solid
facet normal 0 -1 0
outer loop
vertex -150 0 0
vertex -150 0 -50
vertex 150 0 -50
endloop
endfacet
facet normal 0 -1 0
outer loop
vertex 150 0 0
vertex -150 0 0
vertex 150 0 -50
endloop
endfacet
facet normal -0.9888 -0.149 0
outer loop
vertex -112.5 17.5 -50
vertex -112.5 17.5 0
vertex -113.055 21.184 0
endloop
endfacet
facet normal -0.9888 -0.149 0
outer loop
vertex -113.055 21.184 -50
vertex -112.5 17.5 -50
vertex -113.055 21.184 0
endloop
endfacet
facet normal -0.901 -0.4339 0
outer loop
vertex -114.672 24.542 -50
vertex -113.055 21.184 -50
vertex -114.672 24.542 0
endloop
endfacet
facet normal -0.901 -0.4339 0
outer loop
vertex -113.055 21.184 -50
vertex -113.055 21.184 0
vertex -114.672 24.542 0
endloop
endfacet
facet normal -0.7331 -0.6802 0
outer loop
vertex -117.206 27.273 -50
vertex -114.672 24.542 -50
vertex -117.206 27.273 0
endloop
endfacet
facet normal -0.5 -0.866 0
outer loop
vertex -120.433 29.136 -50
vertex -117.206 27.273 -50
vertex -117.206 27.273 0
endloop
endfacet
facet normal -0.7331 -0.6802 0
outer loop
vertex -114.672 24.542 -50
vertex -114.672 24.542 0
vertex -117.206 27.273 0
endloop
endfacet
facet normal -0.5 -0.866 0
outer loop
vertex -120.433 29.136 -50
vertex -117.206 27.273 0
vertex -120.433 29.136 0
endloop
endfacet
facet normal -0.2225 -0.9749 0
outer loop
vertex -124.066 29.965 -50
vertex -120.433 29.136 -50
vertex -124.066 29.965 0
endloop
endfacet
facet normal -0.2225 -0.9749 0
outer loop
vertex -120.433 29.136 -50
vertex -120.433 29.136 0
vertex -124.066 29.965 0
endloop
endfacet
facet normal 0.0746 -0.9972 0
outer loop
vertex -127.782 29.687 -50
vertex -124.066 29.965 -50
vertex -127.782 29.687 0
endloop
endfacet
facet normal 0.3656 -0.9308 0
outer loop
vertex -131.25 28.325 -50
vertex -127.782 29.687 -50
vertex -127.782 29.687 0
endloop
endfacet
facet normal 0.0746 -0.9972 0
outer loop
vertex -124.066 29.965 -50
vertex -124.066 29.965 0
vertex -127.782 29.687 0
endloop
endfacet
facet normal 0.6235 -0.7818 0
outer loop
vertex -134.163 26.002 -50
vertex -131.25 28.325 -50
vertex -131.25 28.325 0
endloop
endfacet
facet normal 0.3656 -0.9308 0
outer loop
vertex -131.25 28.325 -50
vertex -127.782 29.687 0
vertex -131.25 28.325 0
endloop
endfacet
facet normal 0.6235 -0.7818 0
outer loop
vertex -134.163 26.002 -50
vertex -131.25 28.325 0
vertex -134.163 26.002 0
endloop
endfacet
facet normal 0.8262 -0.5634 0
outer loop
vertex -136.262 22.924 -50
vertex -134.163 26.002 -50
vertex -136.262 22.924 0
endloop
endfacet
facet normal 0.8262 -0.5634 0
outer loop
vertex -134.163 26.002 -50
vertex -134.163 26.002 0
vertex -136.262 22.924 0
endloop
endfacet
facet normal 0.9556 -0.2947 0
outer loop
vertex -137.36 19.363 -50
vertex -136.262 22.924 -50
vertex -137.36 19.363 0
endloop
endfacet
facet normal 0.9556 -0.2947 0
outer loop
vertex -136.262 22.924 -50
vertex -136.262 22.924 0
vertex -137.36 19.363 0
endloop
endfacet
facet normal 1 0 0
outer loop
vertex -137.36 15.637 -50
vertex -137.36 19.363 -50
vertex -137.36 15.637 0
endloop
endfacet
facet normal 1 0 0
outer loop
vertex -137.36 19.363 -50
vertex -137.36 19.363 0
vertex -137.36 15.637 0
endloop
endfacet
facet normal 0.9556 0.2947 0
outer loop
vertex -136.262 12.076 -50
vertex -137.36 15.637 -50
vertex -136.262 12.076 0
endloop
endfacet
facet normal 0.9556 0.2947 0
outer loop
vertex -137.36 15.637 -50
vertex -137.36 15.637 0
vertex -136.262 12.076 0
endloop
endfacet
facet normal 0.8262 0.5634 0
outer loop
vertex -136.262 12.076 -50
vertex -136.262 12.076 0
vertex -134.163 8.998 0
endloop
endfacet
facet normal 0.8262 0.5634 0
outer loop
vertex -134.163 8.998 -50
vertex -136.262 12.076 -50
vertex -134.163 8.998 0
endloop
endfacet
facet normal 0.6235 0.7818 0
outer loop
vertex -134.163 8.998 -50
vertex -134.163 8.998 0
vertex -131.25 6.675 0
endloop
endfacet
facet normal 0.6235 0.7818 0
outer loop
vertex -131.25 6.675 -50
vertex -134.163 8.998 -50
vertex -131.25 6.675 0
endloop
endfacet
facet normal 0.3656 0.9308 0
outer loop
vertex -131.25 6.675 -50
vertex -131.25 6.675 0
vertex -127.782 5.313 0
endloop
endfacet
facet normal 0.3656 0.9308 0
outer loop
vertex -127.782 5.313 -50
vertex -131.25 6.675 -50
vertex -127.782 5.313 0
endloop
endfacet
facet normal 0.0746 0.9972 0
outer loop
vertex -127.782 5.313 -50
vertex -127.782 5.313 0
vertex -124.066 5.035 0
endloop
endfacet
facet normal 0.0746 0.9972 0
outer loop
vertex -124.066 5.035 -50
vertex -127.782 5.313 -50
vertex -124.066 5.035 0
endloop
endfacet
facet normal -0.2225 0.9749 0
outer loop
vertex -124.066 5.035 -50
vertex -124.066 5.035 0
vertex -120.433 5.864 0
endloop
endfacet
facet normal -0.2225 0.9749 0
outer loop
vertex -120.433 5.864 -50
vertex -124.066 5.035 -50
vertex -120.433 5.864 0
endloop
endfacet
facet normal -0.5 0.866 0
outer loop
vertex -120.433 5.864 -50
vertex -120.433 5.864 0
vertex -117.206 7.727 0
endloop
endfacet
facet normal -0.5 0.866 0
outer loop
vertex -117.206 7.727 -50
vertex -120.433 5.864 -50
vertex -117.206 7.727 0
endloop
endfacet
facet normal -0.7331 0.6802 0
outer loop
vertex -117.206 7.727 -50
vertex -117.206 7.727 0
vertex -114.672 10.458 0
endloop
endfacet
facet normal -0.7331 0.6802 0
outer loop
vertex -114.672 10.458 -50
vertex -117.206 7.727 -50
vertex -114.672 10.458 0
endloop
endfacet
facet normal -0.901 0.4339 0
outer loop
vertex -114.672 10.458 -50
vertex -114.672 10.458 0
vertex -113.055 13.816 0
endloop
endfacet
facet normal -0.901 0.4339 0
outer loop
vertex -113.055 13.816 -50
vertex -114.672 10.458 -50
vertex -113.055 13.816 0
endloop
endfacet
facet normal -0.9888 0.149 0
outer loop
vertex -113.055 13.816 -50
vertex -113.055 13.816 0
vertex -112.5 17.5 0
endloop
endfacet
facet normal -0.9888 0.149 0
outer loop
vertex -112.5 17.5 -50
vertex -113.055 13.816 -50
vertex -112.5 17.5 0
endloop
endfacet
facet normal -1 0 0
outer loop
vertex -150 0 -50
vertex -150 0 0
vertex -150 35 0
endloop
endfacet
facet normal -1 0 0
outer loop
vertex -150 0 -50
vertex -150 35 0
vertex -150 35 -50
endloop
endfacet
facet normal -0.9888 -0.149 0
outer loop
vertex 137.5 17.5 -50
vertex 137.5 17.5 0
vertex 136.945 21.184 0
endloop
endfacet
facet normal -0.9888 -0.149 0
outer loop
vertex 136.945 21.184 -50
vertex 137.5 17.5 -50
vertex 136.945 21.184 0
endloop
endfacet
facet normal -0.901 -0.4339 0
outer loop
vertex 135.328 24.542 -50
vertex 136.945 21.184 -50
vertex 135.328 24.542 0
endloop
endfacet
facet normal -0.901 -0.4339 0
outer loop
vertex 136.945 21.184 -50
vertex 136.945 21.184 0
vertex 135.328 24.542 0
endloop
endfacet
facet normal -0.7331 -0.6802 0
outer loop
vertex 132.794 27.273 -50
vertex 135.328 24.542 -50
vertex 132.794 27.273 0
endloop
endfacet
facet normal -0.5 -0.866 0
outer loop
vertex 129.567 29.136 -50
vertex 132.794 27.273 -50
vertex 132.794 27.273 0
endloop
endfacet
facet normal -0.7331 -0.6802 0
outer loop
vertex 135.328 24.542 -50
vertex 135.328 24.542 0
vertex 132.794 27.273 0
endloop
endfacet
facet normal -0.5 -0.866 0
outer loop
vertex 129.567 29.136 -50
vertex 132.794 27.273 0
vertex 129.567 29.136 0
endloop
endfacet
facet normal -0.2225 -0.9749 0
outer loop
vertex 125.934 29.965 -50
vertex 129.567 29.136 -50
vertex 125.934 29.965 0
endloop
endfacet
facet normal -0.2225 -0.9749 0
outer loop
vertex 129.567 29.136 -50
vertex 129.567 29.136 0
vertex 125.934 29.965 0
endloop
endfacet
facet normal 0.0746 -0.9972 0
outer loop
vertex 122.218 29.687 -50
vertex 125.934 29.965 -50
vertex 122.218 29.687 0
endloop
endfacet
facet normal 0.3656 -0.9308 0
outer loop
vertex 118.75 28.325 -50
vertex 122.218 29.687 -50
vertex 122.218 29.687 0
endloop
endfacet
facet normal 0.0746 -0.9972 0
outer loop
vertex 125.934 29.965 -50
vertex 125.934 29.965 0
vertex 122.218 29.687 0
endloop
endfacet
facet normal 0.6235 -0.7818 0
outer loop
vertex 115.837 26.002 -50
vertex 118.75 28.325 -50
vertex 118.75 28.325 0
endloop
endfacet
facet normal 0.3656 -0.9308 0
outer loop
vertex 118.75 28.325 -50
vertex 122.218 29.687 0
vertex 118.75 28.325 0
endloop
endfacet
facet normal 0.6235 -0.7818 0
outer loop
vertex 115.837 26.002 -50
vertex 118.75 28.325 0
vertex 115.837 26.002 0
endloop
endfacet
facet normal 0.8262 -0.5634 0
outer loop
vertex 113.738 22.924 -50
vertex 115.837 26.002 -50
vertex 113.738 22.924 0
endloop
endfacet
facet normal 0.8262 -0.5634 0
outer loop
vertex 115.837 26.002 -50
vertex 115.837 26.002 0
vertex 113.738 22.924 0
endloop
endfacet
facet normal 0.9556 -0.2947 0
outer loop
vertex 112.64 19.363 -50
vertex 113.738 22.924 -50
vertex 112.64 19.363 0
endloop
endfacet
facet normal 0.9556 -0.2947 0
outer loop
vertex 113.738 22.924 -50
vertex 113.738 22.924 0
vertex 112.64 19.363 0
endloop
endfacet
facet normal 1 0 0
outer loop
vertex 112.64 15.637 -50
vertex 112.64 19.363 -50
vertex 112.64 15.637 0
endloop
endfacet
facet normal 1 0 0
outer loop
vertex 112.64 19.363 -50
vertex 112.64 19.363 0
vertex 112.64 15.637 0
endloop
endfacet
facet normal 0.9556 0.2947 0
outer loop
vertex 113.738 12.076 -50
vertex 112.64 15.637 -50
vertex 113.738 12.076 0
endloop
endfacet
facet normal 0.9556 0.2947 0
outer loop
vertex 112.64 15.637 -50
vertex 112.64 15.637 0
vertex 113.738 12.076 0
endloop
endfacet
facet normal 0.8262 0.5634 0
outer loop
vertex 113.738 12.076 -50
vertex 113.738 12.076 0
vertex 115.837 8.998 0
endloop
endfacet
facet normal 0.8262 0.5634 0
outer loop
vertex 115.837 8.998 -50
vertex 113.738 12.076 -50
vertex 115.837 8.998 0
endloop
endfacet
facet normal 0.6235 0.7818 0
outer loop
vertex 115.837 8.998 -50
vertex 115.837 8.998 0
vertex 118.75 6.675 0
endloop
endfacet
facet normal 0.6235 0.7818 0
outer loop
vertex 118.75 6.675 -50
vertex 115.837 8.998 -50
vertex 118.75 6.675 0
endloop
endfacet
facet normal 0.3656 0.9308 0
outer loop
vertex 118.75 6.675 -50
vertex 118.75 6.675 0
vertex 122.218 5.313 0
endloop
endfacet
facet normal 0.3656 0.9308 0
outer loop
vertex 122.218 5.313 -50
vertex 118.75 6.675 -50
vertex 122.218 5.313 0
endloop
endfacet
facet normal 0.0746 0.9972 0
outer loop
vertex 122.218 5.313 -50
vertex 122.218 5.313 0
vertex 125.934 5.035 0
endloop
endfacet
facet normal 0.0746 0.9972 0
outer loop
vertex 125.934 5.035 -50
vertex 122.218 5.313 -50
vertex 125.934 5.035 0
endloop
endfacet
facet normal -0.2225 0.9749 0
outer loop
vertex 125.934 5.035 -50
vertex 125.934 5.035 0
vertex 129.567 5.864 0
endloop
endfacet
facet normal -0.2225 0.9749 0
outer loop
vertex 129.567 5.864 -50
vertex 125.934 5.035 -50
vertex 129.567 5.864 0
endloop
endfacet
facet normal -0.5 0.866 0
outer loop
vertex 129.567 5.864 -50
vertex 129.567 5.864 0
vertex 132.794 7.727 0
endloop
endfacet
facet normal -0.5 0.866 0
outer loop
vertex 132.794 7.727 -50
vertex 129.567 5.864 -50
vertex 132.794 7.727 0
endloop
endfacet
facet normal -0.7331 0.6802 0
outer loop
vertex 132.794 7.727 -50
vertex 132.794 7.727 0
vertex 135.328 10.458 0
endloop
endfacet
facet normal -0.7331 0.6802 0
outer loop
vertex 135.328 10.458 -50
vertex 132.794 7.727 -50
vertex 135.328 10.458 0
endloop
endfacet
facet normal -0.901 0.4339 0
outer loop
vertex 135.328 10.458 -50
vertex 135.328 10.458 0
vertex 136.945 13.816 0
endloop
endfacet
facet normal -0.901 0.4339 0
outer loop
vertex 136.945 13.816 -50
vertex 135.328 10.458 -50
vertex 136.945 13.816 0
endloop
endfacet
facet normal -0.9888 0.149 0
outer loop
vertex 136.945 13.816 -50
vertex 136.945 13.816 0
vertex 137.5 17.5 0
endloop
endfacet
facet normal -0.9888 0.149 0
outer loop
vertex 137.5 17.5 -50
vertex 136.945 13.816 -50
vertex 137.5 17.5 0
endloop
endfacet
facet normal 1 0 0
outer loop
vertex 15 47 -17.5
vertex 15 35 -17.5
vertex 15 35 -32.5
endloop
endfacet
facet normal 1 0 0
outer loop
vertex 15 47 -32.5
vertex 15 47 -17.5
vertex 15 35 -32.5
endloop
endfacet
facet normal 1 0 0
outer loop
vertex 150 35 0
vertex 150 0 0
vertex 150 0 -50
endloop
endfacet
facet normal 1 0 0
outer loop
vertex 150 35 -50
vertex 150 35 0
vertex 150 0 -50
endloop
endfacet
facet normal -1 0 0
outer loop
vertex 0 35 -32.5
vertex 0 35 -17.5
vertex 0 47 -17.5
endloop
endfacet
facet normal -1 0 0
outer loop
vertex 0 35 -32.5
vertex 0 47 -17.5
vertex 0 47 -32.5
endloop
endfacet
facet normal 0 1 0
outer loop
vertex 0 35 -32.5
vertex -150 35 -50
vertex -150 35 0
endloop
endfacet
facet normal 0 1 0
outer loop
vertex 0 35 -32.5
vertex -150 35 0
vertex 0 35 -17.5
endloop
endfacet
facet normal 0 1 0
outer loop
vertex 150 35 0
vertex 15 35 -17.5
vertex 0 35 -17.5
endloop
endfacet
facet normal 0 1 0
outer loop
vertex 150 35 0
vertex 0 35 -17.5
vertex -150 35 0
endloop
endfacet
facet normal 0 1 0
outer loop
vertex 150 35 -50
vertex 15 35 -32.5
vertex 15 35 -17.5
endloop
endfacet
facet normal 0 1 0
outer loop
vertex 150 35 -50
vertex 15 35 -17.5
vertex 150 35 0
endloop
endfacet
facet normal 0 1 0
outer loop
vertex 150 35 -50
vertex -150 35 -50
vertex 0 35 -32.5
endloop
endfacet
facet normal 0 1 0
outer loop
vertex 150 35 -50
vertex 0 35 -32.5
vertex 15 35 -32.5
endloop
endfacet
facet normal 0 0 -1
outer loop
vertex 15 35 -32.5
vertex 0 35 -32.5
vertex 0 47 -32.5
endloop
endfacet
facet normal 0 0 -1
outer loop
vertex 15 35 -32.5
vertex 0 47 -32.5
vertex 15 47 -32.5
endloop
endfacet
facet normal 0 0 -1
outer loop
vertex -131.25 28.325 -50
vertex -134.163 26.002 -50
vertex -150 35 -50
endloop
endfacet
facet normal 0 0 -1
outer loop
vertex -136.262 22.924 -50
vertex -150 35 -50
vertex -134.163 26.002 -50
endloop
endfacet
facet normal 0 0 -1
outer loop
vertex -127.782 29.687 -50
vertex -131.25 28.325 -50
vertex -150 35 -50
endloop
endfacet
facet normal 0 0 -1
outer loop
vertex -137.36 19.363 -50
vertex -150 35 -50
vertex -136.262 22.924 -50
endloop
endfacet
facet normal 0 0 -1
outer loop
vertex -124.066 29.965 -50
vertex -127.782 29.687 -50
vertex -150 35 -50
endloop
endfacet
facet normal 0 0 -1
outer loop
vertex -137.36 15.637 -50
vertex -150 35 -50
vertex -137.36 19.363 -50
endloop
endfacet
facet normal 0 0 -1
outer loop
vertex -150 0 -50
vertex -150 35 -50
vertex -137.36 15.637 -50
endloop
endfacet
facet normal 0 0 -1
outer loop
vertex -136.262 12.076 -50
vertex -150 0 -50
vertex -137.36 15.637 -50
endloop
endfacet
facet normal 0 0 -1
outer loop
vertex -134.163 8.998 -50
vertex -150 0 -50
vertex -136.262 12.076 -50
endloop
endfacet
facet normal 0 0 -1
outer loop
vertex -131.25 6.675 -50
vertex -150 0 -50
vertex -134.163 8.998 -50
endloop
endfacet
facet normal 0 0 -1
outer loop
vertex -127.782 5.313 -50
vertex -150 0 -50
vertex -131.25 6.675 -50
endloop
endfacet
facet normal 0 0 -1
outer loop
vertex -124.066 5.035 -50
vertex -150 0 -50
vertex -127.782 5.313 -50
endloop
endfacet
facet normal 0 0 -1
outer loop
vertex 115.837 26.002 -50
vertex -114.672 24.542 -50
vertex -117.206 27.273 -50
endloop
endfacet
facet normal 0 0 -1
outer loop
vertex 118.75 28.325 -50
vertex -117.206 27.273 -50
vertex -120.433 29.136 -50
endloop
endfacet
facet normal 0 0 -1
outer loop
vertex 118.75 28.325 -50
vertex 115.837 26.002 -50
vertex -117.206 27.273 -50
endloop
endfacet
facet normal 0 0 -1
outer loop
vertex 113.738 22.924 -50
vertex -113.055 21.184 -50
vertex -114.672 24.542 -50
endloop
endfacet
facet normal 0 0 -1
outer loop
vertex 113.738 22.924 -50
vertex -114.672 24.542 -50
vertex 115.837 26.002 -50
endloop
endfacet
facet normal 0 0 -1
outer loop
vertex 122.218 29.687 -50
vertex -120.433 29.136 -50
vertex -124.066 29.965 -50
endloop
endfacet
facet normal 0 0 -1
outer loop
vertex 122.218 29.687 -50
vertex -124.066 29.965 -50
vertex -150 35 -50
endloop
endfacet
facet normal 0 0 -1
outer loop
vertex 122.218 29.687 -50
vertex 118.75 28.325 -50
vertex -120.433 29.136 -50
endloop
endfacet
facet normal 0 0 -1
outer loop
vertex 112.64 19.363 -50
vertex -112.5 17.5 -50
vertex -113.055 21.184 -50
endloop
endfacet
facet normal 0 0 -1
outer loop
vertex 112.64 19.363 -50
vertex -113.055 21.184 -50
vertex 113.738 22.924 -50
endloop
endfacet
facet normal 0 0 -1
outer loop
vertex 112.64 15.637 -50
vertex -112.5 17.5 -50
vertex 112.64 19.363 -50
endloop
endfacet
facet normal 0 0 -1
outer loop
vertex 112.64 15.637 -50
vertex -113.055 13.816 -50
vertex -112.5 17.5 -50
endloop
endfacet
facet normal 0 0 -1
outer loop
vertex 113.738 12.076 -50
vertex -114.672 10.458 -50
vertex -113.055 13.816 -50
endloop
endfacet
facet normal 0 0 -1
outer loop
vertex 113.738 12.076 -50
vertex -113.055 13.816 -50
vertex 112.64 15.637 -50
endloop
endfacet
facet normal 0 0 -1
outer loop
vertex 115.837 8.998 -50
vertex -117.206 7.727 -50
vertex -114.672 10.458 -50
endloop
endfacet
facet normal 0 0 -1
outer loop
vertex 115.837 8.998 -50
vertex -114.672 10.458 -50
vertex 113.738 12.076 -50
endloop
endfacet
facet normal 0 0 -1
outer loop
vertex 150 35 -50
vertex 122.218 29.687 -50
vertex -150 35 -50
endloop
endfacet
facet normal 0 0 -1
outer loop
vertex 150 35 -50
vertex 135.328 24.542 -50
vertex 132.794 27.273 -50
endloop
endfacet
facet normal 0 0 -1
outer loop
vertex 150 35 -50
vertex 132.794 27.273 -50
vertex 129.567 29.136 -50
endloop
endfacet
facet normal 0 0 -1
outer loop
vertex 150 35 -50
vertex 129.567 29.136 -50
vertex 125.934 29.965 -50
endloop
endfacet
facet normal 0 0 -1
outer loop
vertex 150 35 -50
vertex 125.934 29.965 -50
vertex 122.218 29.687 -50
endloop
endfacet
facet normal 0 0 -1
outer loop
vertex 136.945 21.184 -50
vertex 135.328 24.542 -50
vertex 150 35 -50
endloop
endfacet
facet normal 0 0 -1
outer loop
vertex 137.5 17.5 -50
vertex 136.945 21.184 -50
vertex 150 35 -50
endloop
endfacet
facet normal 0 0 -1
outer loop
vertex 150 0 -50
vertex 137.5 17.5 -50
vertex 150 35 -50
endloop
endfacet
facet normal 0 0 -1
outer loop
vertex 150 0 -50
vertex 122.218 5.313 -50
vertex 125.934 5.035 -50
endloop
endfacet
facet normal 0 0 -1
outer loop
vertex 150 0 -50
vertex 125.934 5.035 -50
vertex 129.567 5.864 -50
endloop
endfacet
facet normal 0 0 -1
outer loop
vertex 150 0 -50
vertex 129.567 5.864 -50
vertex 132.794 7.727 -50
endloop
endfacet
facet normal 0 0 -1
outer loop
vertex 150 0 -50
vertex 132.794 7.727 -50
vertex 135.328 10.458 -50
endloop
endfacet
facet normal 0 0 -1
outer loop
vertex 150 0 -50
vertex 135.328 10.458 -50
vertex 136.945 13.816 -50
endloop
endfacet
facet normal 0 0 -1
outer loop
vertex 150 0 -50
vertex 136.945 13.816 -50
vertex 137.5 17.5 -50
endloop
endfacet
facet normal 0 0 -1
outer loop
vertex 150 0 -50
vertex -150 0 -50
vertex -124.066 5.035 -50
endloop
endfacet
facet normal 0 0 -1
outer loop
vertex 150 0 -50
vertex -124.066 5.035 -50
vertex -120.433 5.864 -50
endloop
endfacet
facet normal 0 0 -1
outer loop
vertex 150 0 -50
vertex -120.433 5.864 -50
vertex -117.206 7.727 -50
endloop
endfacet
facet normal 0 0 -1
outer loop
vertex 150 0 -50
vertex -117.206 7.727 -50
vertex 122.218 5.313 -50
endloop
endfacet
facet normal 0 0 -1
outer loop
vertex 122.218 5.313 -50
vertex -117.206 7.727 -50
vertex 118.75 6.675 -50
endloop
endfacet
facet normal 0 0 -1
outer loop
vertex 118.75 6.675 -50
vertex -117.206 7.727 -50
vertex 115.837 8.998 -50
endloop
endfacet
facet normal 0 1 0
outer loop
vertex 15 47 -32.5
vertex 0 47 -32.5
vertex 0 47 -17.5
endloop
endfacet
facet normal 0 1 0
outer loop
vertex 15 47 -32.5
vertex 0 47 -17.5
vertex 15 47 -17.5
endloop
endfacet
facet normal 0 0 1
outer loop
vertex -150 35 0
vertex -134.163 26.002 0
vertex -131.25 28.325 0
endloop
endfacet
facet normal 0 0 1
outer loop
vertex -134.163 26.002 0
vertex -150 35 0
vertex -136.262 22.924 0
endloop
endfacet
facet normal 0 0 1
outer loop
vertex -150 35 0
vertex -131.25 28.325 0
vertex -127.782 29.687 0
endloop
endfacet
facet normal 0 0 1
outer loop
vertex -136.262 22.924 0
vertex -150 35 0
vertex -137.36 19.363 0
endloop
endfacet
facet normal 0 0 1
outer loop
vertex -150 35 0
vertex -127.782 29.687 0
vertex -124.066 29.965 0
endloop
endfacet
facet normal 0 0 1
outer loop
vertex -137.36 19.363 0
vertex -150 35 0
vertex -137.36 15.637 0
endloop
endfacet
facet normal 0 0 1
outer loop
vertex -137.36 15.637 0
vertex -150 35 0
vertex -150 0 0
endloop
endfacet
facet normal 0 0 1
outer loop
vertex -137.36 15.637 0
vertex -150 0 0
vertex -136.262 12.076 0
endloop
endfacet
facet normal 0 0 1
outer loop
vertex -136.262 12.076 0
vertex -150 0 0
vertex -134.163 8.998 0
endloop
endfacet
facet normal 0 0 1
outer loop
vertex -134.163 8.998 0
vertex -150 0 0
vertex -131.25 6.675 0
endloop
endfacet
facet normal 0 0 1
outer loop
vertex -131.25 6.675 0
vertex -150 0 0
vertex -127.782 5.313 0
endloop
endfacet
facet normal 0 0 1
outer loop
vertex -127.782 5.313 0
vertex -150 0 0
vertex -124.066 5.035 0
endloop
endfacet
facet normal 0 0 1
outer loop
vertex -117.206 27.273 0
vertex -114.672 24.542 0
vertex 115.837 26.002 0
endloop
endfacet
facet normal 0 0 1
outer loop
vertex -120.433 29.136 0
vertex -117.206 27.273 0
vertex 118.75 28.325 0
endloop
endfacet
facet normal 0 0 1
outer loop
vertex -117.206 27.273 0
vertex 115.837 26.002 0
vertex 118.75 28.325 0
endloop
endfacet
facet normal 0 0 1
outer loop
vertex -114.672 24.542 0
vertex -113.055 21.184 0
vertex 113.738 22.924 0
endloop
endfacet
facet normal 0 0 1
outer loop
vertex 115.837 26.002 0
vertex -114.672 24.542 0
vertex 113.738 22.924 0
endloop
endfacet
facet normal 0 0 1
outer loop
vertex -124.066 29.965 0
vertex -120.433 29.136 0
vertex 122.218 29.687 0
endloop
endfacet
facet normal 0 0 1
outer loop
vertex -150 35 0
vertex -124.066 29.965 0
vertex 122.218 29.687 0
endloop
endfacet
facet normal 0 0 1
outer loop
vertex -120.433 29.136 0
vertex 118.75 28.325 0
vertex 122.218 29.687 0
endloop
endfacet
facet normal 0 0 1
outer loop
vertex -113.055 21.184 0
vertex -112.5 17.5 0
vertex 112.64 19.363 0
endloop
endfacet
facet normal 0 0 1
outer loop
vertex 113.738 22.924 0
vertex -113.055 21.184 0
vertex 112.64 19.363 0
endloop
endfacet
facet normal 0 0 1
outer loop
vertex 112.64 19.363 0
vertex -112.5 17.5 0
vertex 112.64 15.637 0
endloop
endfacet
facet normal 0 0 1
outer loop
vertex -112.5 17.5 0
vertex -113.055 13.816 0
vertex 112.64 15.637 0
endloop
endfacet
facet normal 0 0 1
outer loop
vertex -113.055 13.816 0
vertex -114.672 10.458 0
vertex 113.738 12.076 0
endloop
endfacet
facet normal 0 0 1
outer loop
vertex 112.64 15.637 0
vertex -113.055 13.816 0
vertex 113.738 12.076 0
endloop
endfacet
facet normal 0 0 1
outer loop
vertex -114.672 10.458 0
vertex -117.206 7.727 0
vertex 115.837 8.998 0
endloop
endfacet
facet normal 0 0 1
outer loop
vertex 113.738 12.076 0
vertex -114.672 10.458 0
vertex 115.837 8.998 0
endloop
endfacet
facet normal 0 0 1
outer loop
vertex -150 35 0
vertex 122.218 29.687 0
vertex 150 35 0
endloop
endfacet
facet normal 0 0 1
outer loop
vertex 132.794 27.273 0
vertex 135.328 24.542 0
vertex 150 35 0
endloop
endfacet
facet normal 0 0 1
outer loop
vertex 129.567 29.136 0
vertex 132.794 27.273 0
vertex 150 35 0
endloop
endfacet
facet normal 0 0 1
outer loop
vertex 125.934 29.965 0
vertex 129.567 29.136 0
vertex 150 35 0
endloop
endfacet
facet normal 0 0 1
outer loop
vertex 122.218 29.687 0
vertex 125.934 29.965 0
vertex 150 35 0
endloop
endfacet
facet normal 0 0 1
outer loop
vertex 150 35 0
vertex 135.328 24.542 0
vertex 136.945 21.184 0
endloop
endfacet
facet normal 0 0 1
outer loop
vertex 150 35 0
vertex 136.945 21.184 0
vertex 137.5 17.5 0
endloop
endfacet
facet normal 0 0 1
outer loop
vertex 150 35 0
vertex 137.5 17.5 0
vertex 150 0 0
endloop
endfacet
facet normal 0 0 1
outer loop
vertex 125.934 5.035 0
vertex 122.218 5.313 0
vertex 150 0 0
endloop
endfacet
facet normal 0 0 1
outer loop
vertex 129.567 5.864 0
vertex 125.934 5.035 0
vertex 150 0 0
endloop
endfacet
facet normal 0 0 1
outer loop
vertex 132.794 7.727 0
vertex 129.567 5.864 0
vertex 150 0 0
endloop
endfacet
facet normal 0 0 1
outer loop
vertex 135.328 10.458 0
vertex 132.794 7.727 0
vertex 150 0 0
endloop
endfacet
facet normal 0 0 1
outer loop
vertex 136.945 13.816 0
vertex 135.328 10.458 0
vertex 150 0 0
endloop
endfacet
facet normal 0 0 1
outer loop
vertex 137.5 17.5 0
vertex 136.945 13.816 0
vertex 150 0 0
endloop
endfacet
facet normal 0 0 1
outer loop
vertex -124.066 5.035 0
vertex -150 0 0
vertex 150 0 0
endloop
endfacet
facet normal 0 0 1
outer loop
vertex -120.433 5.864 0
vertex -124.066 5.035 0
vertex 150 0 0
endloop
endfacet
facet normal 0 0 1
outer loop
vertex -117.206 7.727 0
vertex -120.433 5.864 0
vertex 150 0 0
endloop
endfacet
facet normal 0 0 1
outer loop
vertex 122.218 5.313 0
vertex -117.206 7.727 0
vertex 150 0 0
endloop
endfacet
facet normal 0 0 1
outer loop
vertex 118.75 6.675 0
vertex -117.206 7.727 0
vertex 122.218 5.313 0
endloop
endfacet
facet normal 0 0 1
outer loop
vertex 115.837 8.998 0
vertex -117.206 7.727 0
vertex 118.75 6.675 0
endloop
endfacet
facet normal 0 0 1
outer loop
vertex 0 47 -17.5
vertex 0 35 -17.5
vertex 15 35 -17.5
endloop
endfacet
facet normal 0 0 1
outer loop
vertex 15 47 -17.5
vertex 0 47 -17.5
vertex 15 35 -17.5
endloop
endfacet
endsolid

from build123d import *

# Parameters (mm, degrees)
SKETCH1_W           = 300
SKETCH1_H           = 50
BOSS_EXTRUDE1_DEPTH = 35
SKETCH2_W           = 15
SKETCH2_H           = 15
BOSS_EXTRUDE2_DEPTH = 12
CUT_EXTRUDE1_REACH  = 166.952
SKETCH3_R           = 12.5


with BuildPart() as part:
    # Sketch1 → Boss-Extrude1 (new body)
    with BuildSketch(Plane(origin=(0, 0, 0), x_dir=(1, 0, 0), z_dir=(0, 1, 0))):
        with Locations((0, 25)):
            Rectangle(SKETCH1_W, SKETCH1_H)
    extrude(amount=BOSS_EXTRUDE1_DEPTH)

    # Sketch2 → Boss-Extrude2 (add)
    with BuildSketch(Plane(origin=(0, 35, 0), x_dir=(1, 0, 0), z_dir=(0, 1, 0))):
        with Locations((7.5, 25)):
            Rectangle(SKETCH2_W, SKETCH2_H)
    extrude(amount=BOSS_EXTRUDE2_DEPTH)

    # Sketch3 → Cut-Extrude1 (cut, up to next)
    with BuildSketch(Plane.XY, mode=Mode.PRIVATE) as cut_extrude1_sk1:
        with Locations((-125, 17.5)):
            Circle(SKETCH3_R)
    cut_extrude1_tool1 = extrude(cut_extrude1_sk1.sketch, amount=-CUT_EXTRUDE1_REACH, mode=Mode.PRIVATE) & part.part
    # Sketch3 → Cut-Extrude1 (cut, up to next)
    with BuildSketch(Plane.XY, mode=Mode.PRIVATE) as cut_extrude1_sk2:
        with Locations((125, 17.5)):
            Circle(SKETCH3_R)
    cut_extrude1_tool2 = extrude(cut_extrude1_sk2.sketch, amount=-CUT_EXTRUDE1_REACH, mode=Mode.PRIVATE) & part.part
    add(cut_extrude1_tool1.solids().sort_by_distance((-125, 17.5, 0))[0], mode=Mode.SUBTRACT)
    add(cut_extrude1_tool2.solids().sort_by_distance((125, 17.5, 0))[0], mode=Mode.SUBTRACT)


solid = part.part
